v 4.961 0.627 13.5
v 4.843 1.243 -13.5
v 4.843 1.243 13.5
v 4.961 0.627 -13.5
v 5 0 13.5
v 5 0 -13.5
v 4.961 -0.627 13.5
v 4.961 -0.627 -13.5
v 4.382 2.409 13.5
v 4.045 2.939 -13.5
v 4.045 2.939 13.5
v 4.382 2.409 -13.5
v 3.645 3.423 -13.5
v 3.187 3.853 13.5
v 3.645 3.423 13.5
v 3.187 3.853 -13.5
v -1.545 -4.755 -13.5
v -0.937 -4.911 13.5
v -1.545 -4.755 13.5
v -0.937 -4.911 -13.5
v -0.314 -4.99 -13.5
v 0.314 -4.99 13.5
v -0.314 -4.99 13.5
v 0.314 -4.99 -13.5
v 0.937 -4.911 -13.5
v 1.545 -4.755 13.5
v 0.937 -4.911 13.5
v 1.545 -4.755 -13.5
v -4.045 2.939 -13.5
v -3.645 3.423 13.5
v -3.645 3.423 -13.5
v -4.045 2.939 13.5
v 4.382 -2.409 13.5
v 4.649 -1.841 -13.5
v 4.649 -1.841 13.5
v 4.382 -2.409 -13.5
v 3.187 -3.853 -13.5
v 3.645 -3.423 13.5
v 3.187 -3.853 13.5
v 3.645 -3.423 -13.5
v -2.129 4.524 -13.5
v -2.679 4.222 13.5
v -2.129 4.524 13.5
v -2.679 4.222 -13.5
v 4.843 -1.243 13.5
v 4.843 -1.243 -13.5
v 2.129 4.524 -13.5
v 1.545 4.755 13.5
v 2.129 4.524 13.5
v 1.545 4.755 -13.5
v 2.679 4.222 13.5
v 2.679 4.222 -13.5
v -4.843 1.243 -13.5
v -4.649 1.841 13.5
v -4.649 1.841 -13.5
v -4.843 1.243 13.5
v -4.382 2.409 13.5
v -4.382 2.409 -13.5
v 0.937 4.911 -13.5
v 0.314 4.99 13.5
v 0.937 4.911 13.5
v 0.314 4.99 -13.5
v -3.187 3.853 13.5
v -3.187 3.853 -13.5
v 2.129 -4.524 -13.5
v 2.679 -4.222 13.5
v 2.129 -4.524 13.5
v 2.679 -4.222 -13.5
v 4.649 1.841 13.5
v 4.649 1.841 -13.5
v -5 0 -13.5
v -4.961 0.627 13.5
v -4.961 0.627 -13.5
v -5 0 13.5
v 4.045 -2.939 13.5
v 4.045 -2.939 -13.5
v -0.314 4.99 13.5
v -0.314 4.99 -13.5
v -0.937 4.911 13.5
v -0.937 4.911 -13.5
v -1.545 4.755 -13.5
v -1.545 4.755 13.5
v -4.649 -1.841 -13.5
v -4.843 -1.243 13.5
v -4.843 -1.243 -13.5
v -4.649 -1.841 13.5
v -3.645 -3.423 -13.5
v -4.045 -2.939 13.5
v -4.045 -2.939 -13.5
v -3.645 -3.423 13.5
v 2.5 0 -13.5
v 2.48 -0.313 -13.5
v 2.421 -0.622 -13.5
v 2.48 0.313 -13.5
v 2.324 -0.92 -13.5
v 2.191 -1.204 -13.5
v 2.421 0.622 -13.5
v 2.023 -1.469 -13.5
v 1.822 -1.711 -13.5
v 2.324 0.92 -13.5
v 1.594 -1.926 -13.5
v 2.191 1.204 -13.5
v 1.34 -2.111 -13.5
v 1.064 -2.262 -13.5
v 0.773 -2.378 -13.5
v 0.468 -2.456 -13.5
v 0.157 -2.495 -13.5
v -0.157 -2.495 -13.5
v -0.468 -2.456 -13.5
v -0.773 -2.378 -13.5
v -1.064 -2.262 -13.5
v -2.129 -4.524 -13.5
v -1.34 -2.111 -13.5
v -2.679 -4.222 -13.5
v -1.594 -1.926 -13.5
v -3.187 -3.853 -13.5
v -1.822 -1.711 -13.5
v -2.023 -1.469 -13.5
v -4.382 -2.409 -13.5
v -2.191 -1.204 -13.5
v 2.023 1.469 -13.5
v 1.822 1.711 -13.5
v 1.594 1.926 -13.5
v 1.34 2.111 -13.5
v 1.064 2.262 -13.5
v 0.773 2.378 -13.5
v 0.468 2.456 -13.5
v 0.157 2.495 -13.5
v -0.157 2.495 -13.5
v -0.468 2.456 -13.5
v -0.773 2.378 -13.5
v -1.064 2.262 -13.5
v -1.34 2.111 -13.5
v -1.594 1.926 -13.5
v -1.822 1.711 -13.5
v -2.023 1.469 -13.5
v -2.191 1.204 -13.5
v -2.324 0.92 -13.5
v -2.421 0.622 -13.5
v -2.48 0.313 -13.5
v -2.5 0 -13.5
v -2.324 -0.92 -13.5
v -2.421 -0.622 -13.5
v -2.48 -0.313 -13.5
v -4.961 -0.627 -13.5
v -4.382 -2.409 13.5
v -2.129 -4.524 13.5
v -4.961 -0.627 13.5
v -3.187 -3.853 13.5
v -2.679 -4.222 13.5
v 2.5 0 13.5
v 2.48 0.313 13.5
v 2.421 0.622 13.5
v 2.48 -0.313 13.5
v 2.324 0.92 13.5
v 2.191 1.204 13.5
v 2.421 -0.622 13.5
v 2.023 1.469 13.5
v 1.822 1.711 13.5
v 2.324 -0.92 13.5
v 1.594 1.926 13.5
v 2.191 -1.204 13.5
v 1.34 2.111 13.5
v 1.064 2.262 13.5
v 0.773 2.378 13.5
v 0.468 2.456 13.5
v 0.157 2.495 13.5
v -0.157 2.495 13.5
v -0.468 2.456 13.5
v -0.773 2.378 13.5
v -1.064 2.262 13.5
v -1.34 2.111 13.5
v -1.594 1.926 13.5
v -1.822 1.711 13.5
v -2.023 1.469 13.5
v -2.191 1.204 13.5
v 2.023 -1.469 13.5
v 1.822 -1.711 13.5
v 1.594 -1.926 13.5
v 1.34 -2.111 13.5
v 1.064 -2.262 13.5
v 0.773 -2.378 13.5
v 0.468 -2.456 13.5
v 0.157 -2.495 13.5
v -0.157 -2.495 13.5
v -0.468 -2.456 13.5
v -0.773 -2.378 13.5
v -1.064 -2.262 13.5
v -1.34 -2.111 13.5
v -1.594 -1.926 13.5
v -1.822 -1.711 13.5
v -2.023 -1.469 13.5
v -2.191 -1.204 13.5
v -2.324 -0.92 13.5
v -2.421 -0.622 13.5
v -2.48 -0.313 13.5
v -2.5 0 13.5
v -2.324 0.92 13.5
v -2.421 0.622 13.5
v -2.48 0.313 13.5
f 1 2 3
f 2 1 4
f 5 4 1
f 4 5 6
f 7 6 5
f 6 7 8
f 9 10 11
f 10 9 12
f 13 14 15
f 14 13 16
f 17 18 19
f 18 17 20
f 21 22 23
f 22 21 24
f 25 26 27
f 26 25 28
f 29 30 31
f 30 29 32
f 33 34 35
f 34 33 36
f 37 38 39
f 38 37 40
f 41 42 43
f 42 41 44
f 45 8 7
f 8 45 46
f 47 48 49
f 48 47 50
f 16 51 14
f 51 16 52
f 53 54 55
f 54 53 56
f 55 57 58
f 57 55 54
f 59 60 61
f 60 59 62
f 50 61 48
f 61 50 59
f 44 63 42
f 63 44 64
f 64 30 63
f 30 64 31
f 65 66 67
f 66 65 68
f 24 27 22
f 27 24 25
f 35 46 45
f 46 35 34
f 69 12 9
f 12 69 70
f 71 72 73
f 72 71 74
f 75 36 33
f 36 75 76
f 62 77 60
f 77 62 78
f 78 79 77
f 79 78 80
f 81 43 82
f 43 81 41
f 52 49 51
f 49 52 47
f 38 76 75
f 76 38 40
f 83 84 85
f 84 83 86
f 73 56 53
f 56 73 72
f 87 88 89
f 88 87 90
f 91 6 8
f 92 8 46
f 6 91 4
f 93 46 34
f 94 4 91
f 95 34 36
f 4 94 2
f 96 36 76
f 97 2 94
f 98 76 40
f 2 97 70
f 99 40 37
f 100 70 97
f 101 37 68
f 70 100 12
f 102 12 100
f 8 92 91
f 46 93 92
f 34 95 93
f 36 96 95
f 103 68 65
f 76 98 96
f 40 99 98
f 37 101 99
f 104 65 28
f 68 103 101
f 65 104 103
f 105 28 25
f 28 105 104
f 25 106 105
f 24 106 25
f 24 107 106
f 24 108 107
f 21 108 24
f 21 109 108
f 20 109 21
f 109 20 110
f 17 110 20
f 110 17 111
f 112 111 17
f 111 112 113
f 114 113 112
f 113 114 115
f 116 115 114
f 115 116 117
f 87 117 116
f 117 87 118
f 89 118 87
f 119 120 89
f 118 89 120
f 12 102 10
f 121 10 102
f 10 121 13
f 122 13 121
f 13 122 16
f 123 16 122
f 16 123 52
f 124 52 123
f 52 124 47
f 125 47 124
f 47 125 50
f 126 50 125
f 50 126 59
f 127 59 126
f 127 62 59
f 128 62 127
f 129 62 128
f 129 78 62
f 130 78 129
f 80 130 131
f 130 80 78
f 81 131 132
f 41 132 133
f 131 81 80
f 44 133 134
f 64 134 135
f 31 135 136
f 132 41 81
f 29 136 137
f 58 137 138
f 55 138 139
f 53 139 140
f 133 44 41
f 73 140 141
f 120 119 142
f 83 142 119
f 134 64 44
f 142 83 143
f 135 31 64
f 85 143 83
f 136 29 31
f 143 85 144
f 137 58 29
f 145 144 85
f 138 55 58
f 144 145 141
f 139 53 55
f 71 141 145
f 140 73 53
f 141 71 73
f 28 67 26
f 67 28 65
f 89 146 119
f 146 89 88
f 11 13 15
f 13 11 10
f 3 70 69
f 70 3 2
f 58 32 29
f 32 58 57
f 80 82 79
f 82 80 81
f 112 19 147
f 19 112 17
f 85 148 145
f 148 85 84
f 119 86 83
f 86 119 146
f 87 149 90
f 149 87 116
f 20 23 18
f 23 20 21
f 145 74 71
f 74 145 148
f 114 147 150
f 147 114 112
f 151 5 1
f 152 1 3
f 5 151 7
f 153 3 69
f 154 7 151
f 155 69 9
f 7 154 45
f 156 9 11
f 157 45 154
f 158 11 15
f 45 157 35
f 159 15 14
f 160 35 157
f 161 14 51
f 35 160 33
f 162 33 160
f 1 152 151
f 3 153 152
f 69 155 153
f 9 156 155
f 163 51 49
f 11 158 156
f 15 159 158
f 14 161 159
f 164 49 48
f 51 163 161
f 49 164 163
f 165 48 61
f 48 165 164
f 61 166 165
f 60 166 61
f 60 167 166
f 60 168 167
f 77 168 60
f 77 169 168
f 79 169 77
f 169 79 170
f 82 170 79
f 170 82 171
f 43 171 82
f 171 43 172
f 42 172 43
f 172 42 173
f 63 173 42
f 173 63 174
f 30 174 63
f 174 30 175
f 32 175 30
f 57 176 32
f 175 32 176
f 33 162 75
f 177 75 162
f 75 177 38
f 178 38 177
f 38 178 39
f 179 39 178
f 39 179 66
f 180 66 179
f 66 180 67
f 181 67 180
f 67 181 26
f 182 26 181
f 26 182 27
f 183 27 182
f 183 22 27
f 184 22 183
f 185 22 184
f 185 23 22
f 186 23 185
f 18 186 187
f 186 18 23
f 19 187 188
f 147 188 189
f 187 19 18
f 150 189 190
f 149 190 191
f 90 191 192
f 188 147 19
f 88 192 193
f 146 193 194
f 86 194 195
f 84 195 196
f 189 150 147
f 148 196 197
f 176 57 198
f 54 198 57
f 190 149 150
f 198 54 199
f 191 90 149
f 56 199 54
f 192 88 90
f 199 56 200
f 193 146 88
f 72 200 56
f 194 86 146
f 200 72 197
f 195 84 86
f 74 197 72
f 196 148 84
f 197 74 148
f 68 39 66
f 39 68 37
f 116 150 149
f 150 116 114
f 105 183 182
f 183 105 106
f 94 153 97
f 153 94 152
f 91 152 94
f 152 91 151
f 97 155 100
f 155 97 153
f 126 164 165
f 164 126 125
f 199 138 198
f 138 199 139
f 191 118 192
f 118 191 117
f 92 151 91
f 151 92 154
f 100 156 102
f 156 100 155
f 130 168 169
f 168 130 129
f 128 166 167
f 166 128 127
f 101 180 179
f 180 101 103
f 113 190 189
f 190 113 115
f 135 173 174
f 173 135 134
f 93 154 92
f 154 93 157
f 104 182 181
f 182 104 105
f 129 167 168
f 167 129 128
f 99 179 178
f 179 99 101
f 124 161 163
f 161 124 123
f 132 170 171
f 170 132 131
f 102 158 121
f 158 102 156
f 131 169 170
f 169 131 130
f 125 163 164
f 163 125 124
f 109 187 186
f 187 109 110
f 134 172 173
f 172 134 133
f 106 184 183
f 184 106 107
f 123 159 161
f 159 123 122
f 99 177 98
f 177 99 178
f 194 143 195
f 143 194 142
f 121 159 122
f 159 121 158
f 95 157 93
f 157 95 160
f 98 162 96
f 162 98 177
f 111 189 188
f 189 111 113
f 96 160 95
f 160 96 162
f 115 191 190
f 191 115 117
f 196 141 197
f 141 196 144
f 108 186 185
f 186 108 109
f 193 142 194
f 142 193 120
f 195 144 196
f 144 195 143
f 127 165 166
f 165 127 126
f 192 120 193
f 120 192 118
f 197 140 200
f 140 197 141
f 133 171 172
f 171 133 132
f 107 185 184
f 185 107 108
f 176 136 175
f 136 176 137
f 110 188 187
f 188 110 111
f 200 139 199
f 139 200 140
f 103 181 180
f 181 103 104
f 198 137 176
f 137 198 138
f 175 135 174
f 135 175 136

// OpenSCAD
$fn = 50;


difference() {
	union() {
		translate(v = [0, 0, -13.5000000000]) {
			cylinder(h = 27, r = 5.0000000000);
		}
	}
	union() {
		translate(v = [0, 0, -100.0000000000]) {
			cylinder(h = 200, r = 2.5000000000);
		}
	}
}
